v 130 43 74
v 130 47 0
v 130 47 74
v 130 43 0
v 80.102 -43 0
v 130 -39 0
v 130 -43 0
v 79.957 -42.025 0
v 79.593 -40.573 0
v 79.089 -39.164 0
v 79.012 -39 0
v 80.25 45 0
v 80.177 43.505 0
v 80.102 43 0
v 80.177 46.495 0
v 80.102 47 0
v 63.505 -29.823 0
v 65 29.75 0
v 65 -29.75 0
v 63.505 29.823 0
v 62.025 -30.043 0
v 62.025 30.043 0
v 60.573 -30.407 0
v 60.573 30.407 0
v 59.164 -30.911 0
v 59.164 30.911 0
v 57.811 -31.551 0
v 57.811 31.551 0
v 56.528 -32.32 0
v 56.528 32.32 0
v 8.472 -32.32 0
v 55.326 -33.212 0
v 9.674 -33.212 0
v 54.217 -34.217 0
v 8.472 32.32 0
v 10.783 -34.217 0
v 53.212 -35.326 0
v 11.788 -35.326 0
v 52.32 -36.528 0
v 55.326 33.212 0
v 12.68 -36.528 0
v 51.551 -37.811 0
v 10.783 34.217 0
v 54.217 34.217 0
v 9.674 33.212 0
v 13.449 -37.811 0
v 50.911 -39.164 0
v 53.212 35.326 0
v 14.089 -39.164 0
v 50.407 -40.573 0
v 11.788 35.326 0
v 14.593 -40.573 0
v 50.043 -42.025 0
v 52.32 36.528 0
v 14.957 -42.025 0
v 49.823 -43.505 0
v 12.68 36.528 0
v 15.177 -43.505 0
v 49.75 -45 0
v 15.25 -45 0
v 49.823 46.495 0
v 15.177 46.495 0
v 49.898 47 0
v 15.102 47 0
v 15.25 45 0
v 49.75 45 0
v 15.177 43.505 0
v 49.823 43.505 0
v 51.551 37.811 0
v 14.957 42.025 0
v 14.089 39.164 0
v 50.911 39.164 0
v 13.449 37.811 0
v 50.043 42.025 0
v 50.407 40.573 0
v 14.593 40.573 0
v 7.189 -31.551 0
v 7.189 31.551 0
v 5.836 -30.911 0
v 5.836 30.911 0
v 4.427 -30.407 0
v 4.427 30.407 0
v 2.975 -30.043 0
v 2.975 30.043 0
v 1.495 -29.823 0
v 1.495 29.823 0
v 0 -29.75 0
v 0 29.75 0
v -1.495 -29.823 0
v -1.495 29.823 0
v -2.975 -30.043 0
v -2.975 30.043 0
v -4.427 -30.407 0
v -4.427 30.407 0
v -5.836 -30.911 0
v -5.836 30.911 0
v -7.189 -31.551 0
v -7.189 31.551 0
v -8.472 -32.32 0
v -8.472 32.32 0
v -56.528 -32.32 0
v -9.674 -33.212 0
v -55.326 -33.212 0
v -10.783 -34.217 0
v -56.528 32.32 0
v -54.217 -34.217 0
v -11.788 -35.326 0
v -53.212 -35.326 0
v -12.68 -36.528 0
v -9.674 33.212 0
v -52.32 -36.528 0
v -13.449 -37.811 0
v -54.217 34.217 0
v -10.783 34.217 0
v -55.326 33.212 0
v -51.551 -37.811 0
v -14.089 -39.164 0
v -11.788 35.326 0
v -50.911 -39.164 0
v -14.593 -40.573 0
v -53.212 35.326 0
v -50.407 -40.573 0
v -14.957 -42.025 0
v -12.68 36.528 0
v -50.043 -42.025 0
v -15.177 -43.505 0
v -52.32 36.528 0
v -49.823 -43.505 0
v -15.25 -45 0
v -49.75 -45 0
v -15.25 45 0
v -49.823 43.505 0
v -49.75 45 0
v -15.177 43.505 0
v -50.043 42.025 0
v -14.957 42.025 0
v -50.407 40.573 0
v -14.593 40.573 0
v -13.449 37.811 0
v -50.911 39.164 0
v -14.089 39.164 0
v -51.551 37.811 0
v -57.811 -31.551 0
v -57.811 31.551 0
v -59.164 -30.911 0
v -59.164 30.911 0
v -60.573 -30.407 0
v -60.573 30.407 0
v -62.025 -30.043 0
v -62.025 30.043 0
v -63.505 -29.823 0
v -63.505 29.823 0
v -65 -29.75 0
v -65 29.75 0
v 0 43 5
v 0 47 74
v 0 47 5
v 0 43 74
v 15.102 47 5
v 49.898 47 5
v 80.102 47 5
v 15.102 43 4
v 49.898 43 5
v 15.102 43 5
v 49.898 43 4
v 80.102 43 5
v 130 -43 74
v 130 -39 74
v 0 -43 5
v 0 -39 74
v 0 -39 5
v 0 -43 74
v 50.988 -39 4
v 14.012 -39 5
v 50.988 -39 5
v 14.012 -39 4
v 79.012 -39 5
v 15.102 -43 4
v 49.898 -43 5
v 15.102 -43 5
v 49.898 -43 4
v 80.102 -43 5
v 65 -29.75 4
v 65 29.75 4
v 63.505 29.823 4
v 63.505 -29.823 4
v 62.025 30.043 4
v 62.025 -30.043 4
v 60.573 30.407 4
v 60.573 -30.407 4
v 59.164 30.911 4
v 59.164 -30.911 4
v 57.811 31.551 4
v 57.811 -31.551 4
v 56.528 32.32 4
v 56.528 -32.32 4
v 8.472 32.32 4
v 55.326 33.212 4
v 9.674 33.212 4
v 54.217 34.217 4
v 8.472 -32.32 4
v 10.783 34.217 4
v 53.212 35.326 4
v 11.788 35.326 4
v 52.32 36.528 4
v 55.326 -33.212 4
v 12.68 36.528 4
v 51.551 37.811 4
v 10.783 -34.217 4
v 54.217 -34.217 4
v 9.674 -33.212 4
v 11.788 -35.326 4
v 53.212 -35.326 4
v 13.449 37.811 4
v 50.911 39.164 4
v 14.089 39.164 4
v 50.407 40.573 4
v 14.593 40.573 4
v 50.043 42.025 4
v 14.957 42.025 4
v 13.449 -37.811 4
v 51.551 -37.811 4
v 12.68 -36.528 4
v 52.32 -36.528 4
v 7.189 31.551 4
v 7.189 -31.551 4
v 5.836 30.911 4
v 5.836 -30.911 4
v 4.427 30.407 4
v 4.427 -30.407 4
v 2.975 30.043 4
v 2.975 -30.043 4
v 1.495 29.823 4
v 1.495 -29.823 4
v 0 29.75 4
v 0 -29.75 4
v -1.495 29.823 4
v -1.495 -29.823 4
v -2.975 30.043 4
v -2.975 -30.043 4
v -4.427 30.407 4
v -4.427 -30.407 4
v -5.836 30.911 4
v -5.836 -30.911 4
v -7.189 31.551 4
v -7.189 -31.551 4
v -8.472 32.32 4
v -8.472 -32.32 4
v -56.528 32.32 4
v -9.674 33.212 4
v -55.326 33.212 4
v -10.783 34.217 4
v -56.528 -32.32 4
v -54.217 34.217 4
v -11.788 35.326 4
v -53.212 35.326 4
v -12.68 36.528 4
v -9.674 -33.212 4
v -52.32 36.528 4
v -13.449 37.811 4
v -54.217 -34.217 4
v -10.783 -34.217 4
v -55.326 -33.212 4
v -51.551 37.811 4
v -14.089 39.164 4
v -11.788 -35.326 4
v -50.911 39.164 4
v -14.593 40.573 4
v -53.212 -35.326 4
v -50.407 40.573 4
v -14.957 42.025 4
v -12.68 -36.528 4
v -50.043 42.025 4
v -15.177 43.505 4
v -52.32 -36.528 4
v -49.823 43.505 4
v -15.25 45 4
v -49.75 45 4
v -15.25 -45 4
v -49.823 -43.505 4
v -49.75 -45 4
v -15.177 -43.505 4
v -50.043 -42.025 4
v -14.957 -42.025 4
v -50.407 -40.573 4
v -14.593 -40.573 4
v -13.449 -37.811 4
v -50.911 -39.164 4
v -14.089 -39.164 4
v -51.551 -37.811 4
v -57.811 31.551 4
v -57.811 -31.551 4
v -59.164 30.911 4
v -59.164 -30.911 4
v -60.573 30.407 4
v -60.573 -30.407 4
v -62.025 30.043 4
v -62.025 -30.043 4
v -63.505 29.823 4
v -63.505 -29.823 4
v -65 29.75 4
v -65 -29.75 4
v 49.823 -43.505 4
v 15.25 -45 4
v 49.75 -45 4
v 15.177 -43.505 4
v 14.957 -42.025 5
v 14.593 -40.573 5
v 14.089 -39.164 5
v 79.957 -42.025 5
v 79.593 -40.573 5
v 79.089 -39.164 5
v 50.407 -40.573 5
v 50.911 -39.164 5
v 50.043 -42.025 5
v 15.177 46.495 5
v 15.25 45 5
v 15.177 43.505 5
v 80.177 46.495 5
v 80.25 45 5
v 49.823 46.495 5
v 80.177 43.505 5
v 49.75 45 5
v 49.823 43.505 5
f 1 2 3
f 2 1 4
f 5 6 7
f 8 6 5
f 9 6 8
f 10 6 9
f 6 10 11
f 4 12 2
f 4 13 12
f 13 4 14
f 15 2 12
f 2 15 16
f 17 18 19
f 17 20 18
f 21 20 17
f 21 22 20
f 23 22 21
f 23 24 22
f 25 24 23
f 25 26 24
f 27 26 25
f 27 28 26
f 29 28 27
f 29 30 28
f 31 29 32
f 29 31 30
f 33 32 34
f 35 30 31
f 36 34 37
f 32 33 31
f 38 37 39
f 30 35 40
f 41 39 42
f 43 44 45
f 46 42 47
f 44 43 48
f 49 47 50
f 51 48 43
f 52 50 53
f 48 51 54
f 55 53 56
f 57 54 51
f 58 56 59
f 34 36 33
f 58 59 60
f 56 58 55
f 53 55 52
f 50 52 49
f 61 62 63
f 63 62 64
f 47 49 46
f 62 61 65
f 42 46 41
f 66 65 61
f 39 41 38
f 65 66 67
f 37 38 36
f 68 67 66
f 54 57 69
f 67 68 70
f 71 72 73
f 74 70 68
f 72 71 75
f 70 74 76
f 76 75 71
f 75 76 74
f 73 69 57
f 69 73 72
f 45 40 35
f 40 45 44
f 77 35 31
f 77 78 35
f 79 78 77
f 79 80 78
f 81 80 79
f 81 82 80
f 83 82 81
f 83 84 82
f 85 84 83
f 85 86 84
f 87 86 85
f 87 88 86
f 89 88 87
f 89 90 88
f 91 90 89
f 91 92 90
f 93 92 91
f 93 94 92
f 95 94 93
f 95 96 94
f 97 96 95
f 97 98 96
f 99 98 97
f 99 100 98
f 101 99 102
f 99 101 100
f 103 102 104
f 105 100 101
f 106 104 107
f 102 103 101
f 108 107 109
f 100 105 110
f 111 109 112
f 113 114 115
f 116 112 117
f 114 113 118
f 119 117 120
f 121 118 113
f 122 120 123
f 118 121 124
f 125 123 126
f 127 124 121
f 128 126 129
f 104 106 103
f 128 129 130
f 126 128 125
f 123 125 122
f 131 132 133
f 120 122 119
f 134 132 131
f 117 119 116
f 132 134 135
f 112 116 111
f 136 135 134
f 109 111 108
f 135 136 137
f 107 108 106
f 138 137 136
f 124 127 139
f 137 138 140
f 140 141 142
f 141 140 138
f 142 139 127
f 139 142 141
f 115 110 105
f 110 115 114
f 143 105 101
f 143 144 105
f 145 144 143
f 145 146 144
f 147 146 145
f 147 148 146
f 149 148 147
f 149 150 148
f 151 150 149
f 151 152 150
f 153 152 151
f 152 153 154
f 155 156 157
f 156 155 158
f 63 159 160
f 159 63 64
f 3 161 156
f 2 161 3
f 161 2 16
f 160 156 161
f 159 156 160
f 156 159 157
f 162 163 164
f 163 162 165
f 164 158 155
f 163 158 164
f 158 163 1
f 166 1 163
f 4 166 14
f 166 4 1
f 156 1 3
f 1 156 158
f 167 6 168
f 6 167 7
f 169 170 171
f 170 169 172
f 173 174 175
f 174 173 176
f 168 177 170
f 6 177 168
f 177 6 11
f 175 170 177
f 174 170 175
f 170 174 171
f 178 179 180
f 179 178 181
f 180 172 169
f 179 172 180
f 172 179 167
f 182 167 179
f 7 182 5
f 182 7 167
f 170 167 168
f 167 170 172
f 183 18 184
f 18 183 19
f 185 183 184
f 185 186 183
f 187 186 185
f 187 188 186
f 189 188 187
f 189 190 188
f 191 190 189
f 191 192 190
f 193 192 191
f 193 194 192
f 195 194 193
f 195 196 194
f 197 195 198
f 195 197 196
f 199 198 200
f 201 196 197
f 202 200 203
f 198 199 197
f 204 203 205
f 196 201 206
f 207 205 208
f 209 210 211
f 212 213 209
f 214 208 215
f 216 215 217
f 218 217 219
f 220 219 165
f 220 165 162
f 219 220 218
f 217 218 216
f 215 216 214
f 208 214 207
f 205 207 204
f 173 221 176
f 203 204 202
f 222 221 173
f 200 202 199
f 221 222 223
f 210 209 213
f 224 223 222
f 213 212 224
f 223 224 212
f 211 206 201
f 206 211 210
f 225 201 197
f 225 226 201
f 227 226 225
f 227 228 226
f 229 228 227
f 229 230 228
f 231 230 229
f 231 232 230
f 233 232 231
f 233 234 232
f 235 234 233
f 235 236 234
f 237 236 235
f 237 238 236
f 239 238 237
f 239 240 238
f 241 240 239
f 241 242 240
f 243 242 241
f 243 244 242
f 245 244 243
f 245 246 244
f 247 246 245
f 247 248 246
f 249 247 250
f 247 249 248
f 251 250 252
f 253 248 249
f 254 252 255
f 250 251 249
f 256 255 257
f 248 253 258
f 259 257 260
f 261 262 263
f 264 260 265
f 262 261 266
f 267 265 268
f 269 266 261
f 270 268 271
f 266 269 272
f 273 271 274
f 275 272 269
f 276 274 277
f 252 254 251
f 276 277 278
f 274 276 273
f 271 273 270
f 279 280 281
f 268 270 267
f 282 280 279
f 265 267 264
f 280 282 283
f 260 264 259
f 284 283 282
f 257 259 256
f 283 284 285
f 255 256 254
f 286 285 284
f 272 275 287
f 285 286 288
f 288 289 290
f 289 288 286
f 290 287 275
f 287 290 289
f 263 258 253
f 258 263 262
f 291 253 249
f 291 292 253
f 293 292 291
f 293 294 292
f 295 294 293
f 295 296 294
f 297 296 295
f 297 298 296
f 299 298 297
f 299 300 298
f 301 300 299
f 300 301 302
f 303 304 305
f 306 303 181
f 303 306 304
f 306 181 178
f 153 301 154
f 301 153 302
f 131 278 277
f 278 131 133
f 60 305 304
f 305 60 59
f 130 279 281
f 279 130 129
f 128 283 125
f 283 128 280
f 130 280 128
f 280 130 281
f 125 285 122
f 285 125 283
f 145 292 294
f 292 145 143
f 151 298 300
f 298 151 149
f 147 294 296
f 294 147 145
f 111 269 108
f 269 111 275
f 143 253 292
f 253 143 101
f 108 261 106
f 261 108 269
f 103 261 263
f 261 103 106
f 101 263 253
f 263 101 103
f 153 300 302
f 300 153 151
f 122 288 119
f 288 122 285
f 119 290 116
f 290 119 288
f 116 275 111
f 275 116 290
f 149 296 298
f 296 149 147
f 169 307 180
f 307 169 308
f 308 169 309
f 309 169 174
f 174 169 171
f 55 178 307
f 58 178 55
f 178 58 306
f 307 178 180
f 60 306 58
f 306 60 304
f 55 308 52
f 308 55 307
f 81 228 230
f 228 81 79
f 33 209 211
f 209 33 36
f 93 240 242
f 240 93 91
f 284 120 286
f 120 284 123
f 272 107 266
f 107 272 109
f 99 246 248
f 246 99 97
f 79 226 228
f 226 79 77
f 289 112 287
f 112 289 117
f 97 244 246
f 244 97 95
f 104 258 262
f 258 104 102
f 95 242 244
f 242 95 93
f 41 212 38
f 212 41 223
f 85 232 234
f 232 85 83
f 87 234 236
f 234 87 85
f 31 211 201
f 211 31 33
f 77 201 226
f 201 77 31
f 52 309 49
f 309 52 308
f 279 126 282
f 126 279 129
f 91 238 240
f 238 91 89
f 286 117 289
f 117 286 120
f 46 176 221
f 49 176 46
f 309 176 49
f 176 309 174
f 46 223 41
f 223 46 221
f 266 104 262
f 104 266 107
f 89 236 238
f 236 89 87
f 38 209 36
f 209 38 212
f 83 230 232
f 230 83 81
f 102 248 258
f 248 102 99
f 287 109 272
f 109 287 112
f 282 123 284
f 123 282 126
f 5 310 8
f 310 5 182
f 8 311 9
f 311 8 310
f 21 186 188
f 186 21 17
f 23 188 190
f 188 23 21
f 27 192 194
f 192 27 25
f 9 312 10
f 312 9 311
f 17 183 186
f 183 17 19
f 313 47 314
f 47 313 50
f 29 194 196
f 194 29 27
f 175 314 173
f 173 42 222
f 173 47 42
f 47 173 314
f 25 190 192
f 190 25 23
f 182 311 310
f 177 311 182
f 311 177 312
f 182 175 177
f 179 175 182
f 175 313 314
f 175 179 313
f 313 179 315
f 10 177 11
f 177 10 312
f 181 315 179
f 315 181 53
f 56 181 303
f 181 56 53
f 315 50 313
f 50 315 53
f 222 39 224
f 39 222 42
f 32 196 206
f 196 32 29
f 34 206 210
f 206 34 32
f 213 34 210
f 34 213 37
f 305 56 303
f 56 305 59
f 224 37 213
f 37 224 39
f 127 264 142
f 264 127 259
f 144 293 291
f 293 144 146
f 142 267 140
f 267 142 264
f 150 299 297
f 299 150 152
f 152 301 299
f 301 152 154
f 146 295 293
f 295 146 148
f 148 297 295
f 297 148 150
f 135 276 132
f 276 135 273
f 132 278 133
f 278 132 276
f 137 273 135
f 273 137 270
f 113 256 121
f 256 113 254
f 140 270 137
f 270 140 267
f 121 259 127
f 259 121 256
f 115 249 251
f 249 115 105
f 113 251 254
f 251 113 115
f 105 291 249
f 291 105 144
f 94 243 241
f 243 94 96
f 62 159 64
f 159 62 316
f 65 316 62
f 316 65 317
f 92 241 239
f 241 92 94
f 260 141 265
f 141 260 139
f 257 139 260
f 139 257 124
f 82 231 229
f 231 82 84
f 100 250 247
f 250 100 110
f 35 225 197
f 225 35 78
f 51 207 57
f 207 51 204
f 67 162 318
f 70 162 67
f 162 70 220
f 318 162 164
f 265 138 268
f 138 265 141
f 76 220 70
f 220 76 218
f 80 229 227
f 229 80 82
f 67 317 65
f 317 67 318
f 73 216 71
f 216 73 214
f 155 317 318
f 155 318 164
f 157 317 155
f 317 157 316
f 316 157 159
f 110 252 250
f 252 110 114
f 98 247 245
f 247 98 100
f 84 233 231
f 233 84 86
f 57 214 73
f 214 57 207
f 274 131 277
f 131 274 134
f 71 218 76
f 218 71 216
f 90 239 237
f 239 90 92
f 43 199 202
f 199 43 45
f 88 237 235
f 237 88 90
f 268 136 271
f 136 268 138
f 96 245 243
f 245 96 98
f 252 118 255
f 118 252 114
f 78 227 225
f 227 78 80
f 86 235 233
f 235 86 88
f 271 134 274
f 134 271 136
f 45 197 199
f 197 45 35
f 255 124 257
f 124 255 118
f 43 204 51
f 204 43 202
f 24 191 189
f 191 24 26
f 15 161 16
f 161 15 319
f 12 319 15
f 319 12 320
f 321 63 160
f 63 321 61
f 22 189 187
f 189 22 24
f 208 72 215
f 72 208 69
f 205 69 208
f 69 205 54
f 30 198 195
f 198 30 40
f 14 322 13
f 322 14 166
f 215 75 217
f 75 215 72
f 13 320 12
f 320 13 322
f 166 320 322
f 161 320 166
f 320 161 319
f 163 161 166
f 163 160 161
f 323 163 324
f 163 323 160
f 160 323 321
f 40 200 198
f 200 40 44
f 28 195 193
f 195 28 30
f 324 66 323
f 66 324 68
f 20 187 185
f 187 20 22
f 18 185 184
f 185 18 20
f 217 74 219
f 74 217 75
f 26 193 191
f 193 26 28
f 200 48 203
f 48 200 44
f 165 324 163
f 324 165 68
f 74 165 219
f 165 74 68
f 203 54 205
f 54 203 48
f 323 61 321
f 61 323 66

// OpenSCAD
// Rack for six 50 mL conical tubes.
// Print orientation: Flat plate on bed (z=0), walls rising to z=70.
// After printing, flip over so walls support tubes.

// Plate dimensions
L     = 130;   // Length (X)
W     = 90;    // Width (Y)
t     = 4;     // Plate thickness (Z)

// Hole dimensions
n_holes = 6;
hole_d  = 30.5;

// Grid layout
row_spacing = 40; // Y spacing
col_spacing = 40; // X spacing

// Wall dimensions
wall_h = 70; // Height of walls from plate (z=4 to z=74)
wall_t = 4;  // Wall thickness (Y)

// Derived positions (centred on origin)
// 3 columns along X, 2 rows along Y
// X positions: -65, 0, 65
// Y positions: -45, 45
x_pos = [-65, 0, 65];
y_pos = [-45, 45];

$fn = 64;

module tube_hole(x, y) {
    translate([x, y, 0]) cylinder(h = t + 1, d = hole_d);
}

module side_wall(side) {
    // side = 1 for right (+Y), -1 for left (-Y)
    // Wall runs along X, thickness in Y
    translate([0, side * (W / 2 - wall_t / 2), 0]) {
        // Base of wall (part of plate thickness)
        cube([L, wall_t, t]);
        // Rising part of wall
        translate([0, 0, t]) cube([L, wall_t, wall_h]);
    }
}

difference() {
    union() {
        // 1. Main Plate
        translate([-L / 2, -W / 2, 0]) cube([L, W, t]);

        // 2. Side Walls
        side_wall(1);
        side_wall(-1);
    }

    // 3. Cut out holes for tubes
    for (i = [0 : n_holes - 1]) {
        row = i / 3; // 0 or 1
        col = i % 3; // 0, 1, 2
        x = x_pos[col];
        y = y_pos[row];
        tube_hole(x, y);
    }
}
